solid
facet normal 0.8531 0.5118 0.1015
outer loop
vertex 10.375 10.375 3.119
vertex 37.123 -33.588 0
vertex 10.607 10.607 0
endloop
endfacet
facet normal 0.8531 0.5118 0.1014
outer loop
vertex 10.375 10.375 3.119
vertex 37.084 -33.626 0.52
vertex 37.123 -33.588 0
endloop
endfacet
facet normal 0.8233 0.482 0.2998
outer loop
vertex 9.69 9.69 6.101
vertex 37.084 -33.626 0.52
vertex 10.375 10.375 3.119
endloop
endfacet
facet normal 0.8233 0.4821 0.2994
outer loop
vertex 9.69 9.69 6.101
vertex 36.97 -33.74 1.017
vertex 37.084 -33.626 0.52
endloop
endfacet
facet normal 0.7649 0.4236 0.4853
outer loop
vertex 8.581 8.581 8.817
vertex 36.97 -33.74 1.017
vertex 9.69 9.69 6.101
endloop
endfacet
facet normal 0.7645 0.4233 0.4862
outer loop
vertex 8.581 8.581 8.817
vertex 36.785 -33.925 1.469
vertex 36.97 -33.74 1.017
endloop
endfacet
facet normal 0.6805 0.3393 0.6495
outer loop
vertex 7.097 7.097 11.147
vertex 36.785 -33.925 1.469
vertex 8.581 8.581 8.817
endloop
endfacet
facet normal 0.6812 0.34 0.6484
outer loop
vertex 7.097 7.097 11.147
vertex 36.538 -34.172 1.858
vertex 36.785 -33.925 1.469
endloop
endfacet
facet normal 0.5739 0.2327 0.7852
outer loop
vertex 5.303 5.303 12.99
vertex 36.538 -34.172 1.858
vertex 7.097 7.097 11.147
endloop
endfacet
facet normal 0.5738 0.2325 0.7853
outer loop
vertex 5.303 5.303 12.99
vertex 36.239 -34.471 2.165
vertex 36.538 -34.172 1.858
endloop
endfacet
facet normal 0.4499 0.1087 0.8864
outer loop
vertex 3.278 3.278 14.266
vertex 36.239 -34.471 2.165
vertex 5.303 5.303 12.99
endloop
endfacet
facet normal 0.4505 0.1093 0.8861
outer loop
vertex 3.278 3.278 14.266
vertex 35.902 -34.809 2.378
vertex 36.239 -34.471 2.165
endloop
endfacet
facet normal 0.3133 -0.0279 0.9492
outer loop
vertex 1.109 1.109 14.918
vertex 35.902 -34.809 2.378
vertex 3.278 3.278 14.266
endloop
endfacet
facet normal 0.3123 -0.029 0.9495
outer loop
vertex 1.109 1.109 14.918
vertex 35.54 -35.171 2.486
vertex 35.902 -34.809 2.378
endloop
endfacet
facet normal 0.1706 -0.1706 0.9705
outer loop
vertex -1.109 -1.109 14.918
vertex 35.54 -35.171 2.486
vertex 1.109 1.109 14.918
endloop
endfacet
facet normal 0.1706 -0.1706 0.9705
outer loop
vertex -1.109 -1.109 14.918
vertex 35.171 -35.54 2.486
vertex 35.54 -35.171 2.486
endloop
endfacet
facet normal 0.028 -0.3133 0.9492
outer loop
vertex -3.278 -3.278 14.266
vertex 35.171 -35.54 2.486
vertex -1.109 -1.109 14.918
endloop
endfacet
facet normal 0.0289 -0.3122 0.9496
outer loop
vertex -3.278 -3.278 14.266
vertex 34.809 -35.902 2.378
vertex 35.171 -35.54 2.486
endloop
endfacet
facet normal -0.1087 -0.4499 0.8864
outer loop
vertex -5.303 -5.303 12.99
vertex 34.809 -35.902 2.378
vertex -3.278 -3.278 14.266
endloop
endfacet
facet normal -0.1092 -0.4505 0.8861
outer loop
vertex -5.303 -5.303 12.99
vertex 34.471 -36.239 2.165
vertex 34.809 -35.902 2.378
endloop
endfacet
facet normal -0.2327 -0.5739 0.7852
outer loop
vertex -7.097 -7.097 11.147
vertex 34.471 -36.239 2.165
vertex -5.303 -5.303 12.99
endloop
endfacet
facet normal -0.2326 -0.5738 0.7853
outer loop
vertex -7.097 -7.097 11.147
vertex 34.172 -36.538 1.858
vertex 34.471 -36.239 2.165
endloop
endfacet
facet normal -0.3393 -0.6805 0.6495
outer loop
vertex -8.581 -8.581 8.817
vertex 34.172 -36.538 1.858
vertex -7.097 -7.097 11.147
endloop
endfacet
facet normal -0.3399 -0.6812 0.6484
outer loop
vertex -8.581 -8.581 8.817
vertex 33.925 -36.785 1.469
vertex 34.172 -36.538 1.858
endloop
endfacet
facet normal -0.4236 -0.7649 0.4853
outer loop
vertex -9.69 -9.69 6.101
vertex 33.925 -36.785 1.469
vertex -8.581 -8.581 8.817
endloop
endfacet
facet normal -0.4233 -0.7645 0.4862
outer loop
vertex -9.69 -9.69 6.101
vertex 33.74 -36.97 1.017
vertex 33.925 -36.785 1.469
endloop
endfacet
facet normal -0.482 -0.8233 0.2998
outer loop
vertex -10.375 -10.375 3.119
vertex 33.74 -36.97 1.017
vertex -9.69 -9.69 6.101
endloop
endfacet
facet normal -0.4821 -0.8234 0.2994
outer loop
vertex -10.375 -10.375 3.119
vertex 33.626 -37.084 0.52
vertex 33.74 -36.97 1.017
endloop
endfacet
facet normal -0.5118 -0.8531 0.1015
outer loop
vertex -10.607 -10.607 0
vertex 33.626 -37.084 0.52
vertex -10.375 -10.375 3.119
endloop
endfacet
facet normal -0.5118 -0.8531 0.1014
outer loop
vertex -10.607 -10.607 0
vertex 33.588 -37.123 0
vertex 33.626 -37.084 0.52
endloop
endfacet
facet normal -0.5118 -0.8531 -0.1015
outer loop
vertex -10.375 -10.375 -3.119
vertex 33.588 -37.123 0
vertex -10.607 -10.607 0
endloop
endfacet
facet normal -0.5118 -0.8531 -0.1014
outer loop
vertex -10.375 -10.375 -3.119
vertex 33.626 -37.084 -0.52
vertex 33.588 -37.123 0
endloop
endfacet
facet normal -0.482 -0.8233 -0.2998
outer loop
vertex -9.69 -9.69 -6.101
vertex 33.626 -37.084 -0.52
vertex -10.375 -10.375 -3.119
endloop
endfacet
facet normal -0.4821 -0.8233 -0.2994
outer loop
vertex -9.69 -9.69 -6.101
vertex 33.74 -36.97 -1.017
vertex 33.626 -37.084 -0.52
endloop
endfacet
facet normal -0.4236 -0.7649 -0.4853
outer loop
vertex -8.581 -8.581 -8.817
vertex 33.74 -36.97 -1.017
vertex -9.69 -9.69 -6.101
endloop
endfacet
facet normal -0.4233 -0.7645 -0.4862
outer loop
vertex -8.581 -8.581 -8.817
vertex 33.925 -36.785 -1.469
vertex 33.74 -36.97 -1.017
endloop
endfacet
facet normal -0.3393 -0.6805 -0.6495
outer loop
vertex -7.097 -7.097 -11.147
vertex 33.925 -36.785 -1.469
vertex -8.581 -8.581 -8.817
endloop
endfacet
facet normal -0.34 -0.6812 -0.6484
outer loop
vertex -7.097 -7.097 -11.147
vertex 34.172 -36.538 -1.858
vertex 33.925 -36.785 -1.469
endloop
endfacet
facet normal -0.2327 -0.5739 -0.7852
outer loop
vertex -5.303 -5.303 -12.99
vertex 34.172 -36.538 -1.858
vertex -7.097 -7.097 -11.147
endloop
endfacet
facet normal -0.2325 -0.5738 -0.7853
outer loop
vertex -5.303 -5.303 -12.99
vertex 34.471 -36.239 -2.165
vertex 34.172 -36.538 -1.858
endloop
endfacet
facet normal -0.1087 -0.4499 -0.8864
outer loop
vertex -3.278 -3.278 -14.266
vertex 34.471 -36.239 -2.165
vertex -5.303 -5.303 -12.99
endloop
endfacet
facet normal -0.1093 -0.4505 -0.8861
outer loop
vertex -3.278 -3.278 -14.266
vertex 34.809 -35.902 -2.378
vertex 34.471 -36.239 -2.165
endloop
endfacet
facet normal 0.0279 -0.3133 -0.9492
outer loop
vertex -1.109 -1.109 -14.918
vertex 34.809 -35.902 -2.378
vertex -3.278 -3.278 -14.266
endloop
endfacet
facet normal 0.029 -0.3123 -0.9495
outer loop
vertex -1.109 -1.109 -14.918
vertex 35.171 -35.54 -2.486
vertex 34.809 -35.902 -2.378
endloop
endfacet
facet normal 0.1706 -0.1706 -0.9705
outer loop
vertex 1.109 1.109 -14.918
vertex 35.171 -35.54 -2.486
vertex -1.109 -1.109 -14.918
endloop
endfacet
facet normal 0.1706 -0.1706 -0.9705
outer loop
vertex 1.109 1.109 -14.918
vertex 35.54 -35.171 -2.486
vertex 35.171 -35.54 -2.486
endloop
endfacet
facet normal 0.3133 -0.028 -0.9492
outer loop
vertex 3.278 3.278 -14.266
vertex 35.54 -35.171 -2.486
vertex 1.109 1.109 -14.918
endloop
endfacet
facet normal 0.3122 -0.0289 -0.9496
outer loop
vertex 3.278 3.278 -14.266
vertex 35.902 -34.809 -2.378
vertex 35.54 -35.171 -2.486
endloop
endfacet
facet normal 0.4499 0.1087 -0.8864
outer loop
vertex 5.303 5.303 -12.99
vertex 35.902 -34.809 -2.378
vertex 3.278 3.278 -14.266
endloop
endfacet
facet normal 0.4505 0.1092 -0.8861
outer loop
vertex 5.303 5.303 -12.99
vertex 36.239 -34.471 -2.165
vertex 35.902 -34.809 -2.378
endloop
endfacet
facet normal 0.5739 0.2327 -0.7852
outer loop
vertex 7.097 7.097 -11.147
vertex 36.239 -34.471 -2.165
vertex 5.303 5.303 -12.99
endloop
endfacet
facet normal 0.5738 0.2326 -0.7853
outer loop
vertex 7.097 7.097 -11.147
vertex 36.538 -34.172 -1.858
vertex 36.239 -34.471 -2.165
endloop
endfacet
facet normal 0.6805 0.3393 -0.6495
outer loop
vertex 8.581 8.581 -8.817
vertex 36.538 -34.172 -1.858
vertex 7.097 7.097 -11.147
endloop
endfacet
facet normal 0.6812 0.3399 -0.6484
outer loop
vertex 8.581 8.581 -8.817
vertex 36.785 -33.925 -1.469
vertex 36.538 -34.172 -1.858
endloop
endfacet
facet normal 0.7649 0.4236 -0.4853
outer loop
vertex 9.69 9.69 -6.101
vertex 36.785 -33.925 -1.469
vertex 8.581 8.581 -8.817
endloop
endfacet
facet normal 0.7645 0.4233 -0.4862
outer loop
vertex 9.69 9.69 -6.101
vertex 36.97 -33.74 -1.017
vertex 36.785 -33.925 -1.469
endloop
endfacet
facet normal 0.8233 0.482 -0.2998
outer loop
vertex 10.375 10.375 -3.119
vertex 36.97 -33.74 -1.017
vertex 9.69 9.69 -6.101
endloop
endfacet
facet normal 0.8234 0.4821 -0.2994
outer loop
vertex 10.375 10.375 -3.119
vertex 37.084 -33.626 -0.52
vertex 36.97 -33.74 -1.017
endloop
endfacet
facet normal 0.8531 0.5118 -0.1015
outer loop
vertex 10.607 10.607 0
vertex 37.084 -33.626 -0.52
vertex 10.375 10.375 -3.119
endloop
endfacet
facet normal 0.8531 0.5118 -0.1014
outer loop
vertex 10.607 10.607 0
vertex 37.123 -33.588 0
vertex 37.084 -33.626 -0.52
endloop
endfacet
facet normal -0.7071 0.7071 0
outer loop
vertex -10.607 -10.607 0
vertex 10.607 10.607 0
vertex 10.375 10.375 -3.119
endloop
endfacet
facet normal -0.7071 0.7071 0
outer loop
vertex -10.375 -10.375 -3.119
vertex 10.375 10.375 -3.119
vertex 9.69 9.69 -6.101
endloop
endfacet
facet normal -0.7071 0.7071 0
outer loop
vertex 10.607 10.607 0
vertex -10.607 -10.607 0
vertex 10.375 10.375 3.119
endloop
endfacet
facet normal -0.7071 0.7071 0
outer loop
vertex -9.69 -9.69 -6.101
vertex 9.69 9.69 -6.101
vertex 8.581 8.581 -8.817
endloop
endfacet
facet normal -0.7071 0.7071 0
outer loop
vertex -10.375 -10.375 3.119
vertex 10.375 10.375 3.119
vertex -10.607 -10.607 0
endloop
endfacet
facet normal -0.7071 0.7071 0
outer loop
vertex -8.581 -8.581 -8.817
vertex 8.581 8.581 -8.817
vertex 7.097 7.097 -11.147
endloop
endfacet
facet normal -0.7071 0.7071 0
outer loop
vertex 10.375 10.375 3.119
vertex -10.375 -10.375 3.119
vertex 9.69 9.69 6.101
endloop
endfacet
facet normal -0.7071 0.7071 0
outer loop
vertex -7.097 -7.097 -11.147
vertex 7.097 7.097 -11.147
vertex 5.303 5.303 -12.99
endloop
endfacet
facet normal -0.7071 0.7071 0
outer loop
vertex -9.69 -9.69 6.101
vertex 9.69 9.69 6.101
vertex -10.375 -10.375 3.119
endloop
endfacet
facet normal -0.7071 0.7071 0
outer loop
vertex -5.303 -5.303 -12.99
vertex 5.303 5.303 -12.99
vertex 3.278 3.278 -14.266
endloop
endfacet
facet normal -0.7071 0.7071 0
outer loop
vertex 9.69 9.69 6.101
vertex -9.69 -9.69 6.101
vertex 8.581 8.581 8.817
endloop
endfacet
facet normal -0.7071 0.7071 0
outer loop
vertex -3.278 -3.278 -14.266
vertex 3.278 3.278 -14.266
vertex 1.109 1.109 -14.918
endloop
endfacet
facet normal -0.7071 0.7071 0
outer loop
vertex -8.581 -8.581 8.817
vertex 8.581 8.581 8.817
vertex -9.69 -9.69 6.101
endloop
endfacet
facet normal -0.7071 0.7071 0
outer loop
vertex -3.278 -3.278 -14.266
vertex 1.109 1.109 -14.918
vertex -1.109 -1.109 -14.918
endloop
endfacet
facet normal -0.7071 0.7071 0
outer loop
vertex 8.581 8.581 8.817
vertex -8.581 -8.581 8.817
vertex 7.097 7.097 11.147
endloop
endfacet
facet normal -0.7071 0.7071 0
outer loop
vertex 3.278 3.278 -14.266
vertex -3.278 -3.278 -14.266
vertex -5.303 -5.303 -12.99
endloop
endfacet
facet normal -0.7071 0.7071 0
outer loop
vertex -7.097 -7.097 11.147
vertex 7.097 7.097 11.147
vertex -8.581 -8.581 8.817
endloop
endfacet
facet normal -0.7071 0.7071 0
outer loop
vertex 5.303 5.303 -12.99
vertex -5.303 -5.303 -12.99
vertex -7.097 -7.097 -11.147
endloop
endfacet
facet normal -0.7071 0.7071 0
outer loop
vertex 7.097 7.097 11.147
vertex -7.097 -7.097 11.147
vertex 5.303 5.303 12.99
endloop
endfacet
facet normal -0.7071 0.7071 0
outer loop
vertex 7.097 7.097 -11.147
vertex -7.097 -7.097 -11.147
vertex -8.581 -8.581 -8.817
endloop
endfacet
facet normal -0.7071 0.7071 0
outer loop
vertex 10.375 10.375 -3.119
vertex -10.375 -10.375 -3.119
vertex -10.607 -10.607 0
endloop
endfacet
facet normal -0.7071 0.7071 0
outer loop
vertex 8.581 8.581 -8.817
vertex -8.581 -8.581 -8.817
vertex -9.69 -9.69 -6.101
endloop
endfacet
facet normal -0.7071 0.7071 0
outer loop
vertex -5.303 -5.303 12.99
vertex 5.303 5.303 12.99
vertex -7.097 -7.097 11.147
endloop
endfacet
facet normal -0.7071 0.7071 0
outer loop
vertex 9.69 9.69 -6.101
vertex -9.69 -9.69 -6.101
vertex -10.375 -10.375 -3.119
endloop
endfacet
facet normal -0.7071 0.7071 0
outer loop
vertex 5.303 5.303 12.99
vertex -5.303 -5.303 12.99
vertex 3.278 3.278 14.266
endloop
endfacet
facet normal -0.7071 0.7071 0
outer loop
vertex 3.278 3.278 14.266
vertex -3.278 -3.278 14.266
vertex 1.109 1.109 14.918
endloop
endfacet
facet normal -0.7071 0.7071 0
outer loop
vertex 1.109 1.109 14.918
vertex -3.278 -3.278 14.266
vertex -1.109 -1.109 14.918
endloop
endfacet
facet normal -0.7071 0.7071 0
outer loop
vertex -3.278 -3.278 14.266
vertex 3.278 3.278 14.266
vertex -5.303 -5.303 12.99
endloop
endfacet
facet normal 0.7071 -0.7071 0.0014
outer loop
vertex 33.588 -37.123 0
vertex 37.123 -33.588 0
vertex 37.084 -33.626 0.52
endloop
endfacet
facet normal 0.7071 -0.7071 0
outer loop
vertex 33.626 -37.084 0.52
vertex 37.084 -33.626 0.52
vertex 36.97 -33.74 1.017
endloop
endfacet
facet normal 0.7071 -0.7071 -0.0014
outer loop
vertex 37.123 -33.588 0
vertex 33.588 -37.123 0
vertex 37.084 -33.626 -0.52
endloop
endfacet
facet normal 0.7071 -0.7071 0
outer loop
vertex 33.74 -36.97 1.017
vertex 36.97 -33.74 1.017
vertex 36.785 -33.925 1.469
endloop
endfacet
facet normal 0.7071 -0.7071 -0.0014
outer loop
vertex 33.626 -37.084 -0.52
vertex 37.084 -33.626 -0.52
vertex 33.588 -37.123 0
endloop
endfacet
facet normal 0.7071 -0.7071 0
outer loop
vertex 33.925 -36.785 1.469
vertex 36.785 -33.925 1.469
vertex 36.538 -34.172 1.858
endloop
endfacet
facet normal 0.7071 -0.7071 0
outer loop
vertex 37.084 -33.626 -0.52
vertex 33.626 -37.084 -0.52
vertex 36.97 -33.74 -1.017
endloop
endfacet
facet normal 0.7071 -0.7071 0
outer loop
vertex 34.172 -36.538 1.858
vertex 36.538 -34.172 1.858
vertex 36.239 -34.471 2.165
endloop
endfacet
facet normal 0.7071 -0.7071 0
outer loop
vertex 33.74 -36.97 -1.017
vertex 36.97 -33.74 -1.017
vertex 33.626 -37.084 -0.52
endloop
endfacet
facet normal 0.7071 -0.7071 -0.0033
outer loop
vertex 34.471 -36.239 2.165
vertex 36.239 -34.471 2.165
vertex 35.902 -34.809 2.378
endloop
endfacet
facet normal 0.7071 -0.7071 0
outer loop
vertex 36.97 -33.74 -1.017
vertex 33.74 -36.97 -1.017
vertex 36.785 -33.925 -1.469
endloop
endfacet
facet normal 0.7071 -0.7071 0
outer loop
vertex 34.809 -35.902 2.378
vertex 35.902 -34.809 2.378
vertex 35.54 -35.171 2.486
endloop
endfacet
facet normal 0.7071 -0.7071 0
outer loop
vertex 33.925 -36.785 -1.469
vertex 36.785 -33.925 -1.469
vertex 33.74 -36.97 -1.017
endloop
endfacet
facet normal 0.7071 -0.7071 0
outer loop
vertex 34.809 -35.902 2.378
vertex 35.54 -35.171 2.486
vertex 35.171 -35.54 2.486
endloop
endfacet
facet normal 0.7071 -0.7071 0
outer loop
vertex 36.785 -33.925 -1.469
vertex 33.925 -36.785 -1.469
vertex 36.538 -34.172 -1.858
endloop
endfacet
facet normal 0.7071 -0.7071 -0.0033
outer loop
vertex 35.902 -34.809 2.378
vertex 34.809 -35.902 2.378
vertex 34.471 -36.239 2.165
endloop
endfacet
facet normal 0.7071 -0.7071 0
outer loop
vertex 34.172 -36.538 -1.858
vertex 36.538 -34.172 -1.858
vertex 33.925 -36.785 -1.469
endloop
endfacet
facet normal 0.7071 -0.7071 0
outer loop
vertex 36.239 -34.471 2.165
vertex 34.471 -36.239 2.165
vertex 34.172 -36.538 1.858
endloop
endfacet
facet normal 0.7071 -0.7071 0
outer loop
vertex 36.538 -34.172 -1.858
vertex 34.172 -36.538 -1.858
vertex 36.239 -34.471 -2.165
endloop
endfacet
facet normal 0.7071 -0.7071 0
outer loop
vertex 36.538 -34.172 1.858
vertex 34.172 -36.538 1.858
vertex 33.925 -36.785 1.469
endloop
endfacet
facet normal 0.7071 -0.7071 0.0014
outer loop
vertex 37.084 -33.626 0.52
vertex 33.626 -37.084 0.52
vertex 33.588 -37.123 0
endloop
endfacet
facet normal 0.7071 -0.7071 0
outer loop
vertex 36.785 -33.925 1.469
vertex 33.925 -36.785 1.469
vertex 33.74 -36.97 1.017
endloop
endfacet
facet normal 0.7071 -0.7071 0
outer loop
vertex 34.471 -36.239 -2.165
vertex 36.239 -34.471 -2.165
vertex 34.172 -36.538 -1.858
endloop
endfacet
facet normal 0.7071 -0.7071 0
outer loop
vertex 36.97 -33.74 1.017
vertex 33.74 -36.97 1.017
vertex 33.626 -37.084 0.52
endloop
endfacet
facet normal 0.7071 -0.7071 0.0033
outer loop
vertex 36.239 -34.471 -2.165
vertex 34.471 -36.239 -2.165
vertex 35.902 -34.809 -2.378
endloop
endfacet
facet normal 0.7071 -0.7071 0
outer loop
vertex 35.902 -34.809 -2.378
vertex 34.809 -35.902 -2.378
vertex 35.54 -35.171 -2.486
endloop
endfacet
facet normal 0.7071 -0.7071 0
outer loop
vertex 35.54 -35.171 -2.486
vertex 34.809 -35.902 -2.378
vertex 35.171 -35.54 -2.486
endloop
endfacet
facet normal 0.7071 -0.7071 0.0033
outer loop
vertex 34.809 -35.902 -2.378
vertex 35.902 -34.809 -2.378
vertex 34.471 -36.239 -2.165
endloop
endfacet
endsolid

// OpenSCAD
// rotation around z-axis
zRot = 45; // [0:360]
allColors = "red";
echo("zRot: ", zRot);
color(allColors)
    rotate([90, 0, zRot])
        cylinder(d1 = 30, d2 = 5, h = 50);
